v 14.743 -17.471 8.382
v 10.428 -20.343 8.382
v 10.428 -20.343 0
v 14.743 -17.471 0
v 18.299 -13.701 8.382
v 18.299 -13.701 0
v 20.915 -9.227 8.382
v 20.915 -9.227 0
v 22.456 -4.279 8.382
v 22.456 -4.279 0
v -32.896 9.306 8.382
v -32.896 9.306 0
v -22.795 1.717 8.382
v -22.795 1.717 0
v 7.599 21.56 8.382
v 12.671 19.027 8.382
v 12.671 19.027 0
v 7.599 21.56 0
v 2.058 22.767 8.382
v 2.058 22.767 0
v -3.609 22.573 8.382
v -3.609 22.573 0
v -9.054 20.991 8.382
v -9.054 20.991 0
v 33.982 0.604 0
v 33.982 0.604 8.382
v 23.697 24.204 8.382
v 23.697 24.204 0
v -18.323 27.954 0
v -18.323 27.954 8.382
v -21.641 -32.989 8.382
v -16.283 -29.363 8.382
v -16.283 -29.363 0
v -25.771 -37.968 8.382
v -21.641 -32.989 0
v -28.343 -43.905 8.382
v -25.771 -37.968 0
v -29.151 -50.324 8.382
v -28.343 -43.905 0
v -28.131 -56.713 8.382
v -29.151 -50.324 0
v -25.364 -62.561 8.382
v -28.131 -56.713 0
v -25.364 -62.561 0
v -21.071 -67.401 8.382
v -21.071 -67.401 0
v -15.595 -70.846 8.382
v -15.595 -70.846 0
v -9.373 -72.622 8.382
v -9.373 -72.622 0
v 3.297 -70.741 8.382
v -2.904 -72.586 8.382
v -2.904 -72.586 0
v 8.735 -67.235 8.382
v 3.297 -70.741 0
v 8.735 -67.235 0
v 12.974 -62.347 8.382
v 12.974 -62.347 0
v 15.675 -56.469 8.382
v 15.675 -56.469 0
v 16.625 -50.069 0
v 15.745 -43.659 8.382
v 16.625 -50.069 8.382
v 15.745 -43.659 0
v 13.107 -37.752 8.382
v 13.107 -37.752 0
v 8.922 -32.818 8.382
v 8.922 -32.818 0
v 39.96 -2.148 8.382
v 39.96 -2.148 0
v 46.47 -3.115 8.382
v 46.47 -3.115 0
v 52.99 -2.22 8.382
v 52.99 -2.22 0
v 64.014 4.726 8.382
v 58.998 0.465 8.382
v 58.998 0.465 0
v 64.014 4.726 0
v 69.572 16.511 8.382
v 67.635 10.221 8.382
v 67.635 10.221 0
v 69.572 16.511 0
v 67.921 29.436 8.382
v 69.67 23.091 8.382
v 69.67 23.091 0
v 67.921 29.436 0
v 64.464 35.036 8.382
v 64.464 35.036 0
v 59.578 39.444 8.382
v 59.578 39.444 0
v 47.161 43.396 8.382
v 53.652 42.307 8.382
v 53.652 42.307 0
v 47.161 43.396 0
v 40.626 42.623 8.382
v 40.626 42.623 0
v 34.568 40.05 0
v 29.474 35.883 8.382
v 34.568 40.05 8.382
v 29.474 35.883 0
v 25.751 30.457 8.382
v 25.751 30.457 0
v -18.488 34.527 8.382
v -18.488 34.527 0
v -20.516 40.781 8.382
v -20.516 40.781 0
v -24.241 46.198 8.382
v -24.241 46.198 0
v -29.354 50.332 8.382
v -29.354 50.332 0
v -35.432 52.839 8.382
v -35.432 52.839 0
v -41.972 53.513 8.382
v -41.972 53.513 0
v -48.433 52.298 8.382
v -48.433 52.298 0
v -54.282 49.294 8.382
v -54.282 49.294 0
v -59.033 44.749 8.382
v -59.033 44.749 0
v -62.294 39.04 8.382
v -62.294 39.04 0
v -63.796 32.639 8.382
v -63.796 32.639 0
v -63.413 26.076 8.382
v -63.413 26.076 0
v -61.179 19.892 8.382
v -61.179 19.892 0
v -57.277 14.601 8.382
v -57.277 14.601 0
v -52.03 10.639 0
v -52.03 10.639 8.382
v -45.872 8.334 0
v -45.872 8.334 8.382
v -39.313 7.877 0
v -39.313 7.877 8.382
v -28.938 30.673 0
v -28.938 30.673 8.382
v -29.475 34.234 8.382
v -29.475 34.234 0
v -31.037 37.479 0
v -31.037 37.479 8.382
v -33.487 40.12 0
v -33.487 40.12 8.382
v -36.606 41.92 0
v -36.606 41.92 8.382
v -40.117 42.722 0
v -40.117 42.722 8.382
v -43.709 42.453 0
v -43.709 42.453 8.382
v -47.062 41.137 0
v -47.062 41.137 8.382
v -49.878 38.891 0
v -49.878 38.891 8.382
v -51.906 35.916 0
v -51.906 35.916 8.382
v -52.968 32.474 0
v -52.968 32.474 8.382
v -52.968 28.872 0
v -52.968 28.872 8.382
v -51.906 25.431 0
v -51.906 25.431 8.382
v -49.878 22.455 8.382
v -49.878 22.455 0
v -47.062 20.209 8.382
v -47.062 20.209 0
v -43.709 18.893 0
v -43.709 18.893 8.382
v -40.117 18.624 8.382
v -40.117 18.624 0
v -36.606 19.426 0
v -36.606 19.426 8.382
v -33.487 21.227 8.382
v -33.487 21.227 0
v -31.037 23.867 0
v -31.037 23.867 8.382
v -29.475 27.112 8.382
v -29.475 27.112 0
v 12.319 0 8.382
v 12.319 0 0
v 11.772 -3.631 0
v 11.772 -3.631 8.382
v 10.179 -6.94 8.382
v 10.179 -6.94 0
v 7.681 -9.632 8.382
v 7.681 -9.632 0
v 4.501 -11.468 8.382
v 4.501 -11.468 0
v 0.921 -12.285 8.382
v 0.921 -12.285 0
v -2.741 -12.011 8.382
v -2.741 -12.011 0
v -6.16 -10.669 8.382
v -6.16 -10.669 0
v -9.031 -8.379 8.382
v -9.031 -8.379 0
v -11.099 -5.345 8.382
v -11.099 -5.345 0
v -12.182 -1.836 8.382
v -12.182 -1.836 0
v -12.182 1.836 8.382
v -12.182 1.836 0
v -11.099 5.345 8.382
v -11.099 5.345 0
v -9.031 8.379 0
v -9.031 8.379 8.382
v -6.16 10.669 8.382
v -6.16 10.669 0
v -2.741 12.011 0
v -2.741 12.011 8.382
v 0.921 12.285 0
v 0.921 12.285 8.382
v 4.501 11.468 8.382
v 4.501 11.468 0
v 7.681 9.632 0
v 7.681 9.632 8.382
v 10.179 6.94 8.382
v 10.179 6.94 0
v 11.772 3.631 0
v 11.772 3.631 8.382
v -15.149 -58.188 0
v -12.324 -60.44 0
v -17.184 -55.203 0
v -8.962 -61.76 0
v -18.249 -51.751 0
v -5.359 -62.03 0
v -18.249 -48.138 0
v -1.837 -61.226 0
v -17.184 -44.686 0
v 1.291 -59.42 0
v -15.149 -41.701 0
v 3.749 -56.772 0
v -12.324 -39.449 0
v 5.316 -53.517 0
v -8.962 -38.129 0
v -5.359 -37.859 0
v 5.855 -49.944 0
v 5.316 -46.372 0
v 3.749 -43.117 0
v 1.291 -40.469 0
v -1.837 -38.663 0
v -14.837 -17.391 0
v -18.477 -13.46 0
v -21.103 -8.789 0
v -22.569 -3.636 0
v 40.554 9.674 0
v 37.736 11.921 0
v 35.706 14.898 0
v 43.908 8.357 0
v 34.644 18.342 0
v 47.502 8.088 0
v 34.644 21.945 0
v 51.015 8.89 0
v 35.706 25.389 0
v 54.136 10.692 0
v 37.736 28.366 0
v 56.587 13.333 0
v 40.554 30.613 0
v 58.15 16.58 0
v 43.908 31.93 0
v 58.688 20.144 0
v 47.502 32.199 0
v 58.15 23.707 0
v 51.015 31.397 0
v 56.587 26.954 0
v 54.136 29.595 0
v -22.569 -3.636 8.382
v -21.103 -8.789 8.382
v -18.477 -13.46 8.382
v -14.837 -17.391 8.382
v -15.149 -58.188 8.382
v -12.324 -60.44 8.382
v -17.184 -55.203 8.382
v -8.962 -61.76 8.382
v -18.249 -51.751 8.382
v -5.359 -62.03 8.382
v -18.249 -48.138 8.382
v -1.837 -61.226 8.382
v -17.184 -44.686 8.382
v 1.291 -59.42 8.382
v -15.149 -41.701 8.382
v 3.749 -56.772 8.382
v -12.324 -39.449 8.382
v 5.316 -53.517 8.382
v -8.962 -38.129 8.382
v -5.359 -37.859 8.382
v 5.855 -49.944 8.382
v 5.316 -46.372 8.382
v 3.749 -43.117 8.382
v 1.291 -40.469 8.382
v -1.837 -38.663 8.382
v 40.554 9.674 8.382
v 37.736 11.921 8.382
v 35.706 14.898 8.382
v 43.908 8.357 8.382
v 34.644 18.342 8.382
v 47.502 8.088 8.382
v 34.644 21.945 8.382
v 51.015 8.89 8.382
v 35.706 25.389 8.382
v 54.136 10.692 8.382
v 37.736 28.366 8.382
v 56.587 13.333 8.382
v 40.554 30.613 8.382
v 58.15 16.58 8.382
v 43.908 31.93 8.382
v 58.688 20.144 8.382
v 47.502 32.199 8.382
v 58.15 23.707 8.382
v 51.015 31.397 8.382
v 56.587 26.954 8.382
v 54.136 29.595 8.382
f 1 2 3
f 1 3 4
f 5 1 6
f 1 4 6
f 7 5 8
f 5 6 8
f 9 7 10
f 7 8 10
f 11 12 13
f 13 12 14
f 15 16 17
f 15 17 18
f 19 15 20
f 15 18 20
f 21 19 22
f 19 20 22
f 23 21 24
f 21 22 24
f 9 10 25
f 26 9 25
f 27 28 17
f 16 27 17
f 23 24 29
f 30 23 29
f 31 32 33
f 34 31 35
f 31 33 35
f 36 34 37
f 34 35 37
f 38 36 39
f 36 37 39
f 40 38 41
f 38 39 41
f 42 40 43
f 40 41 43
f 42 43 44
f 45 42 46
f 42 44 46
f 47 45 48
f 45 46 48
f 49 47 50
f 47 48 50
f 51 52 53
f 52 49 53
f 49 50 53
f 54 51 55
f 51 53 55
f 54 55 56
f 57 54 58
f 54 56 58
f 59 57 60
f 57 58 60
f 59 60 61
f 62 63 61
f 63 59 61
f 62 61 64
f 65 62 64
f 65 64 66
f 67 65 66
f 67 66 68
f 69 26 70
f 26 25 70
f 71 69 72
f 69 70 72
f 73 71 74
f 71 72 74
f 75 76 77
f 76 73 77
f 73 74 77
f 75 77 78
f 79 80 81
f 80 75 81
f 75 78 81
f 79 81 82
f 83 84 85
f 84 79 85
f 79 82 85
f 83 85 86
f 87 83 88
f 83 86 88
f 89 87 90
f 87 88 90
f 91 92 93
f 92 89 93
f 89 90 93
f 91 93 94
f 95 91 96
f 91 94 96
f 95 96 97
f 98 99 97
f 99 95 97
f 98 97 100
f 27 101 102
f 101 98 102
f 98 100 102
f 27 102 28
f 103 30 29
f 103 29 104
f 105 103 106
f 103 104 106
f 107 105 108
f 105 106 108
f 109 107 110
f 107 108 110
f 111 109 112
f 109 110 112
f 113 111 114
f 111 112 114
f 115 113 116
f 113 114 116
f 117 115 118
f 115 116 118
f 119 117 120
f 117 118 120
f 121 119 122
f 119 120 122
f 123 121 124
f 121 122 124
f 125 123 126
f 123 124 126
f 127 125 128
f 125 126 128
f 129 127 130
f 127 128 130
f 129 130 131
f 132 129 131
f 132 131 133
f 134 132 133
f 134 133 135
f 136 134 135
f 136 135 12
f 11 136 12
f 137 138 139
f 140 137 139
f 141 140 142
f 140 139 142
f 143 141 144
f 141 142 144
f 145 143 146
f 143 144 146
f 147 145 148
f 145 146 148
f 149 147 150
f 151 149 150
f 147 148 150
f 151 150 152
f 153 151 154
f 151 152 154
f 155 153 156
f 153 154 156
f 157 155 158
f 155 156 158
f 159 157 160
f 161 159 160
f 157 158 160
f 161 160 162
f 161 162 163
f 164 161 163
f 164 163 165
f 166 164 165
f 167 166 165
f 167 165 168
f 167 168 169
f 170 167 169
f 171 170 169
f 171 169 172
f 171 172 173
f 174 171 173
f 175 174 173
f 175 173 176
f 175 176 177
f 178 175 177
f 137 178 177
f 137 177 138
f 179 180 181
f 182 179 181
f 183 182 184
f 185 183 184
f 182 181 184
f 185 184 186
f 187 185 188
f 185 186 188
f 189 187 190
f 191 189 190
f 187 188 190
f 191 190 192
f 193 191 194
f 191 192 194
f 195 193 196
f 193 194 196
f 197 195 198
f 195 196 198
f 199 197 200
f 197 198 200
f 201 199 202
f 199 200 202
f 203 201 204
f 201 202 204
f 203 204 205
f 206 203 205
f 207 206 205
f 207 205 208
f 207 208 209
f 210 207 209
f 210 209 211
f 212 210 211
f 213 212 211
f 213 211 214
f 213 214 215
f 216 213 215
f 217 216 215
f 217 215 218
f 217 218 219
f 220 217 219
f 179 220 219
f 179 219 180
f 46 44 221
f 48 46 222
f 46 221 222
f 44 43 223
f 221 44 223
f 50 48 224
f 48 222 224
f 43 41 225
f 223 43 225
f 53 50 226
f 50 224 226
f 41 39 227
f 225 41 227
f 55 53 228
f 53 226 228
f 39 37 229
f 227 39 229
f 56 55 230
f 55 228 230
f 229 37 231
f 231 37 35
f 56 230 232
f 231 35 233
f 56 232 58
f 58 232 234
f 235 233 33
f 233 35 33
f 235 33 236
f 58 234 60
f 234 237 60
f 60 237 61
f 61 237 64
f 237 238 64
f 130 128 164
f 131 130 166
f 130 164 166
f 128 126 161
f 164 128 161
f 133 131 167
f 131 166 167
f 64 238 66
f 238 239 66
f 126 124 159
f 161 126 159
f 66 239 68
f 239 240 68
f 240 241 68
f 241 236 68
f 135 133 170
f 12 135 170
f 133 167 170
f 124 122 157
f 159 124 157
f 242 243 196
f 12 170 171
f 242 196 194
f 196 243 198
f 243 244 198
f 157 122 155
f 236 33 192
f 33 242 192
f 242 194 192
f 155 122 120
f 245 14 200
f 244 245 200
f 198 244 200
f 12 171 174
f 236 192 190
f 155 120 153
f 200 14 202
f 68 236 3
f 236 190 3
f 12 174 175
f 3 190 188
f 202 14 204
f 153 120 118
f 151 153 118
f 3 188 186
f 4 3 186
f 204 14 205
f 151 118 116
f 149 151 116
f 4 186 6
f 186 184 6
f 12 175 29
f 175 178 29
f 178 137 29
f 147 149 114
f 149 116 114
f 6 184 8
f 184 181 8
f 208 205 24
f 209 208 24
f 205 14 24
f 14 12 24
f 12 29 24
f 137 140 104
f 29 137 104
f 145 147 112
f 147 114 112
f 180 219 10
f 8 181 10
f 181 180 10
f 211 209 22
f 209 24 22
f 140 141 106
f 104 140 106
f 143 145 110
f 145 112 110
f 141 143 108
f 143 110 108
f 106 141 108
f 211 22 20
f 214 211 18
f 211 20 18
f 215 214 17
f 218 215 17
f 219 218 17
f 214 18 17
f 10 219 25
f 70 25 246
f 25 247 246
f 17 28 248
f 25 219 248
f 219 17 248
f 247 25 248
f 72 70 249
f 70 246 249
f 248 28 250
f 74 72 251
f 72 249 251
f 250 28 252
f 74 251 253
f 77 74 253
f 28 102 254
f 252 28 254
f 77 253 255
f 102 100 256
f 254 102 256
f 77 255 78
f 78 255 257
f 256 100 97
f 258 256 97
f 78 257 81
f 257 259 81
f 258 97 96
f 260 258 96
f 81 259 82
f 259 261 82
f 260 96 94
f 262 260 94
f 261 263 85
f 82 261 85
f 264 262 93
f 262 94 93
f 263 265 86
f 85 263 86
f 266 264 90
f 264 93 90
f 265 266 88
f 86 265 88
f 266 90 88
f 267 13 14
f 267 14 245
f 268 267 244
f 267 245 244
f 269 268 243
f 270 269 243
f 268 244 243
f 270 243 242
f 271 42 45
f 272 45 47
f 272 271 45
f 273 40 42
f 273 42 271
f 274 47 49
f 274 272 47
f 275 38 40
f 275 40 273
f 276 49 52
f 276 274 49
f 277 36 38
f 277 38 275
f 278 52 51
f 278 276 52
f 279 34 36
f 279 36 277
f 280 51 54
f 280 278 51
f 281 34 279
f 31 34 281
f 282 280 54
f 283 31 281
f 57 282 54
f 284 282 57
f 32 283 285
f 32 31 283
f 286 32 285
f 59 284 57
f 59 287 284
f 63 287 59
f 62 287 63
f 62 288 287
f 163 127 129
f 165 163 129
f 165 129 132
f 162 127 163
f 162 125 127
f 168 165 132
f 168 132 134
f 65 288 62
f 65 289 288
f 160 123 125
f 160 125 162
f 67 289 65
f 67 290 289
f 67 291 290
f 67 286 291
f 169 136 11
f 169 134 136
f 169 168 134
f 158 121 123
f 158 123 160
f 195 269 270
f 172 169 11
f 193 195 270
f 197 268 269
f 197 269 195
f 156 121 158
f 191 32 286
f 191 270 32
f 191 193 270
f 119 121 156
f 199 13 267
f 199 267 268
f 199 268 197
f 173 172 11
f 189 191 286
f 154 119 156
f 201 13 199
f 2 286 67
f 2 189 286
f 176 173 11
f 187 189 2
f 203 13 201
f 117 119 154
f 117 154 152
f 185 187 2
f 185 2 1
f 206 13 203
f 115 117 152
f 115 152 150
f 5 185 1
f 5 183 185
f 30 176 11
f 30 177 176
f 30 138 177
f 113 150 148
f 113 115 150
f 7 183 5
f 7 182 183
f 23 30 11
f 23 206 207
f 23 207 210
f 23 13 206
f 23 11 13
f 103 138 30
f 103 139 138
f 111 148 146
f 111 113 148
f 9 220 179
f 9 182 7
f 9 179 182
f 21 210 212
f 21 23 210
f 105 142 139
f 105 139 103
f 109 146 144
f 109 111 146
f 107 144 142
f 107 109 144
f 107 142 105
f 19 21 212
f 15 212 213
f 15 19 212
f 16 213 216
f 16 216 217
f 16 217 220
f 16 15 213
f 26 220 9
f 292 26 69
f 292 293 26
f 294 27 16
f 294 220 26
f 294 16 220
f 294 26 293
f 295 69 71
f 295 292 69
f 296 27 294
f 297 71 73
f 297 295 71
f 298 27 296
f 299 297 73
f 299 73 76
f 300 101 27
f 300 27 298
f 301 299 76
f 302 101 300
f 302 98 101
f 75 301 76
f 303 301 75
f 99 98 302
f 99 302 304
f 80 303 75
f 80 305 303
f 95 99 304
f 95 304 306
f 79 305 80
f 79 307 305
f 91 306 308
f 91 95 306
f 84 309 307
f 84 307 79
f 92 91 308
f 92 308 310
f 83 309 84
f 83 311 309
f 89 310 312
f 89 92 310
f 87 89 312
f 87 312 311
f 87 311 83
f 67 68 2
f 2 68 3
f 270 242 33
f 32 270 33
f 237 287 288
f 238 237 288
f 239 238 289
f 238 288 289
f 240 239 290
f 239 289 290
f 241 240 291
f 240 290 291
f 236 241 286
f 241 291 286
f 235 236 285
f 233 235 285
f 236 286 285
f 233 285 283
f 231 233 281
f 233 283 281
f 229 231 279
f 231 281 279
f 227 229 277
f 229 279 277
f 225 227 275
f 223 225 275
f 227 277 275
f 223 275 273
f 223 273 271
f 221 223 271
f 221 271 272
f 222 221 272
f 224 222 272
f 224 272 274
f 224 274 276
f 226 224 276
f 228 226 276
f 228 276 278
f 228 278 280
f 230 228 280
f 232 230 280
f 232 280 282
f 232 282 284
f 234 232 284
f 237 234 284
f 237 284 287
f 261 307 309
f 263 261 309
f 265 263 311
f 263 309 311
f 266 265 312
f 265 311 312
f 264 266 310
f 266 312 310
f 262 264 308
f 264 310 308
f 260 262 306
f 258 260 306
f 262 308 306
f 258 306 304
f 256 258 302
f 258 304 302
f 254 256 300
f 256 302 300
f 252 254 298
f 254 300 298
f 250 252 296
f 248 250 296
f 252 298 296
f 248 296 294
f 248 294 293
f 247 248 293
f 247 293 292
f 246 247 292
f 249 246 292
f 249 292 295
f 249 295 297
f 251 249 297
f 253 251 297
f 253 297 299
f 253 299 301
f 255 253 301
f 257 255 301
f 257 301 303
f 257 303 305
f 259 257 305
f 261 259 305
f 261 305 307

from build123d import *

# Parameters (mm, degrees)
F1_R      = 22.86
F8_DEPTH  = 8.382
F5_R      = 22.86
F5_R_2    = 23.2590602535
F5_R_3    = 22.8896939672
F3_R      = 12.065
F9_DEPTH  = 25.908
F0_R      = 12.065
F10_DEPTH = 39.878
F12_R     = 12.0825397837
F12_R_2   = 12.1193647321
F12_R_3   = 12.0891778509
F13_DEPTH = 25.4
F14_R     = 12.3194510373
F15_DEPTH = 25.4


with BuildPart() as f8:
    # F1 (on Top) → F8 (new body)
    with BuildSketch(Plane.XY):
        Circle(F1_R)
    extrude(amount=F8_DEPTH)

    # F3 (on Top) → F9 (cut)
    with BuildSketch(Plane.XY):
        with Locations((-41.2355296061, 30.9968510523)):
            Circle(F3_R)
        with Locations((47.3912737196, 20.2672132623)):
            Circle(F3_R)
        with Locations((-6.2569124064, -50.5483931394)):
            Circle(F3_R)
    extrude(amount=-F9_DEPTH, mode=Mode.SUBTRACT)


with BuildPart() as f8b:
    # F4 (on Top) → F8, piece 2 (new body)
    with BuildSketch(Plane.XY):
        Polygon((-7.2568234486, -9.9568761684), (0, 0), (-40.8516675234, 30.6916665286), (-48.2515008219, 20.8422329908), align=None)
        Polygon((-40.8516675234, 30.6916665286), (0, 0), (6.6820263642, 9.1682138243), (-33.8416725592, 39.6134790794), align=None)
    extrude(amount=F8_DEPTH)


with BuildPart() as f8c:
    # F5 (on Top) → F8, piece 3 (new body)
    with BuildSketch(Plane.XY):
        with Locations((-41.0204199318, 30.6730984167)):
            Circle(F5_R)
    extrude(amount=F8_DEPTH)


with BuildPart() as f8d:
    # F5 (on Top) → F8, piece 4 (new body)
    with BuildSketch(Plane.XY):
        with Locations((46.5983533047, 20.1435375921)):
            Circle(F5_R_2)
    extrude(amount=F8_DEPTH)


with BuildPart() as f8e:
    # F5 (on Top) → F8, piece 5 (new body)
    with BuildSketch(Plane.XY):
        with Locations((-6.2648058406, -49.9444669655)):
            Circle(F5_R_3)
    extrude(amount=F8_DEPTH)


with BuildPart() as f8f:
    # F6 (on Top) → F8, piece 6 (new body)
    with BuildSketch(Plane.XY):
        Polygon((-6.1354051676, -50.8), (0, 0), (-12.4105271356, 2.6960742232), (-18.6884442668, -49.2838980126), align=None)
        Polygon((12.7, -1.5338512919), (0, 0), (-6.1354051676, -50.8), (6.5645948324, -52.3338512919), align=None)
    extrude(amount=F8_DEPTH)


with BuildPart() as f8g:
    # F7 (on Top) → F8, piece 7 (new body)
    with BuildSketch(Plane.XY):
        Polygon((-4.6202341585, 10.9058370142), (0, 0), (46.7755481242, 19.8163593447), (41.3952207145, 32.5163593447), align=None)
        Polygon((46.7755481242, 19.8163593447), (0, 0), (5.4993537205, -11.462887171), (51.7296379604, 8.1224723137), align=None)
    extrude(amount=F8_DEPTH)


with BuildPart() as f10_tool:
    # F0 (on Top) → F10 (new body)
    with BuildSketch(Plane.XY):
        Circle(F0_R)
    extrude(amount=F10_DEPTH)


with BuildPart() as f8_1:
    add(f8.part)

    # F10: cut by f10_tool
    add(f10_tool.part, mode=Mode.SUBTRACT)


with BuildPart() as f8b_1:
    add(f8b.part)

    # F10: cut by f10_tool
    add(f10_tool.part, mode=Mode.SUBTRACT)


with BuildPart() as f8f_1:
    add(f8f.part)

    # F10: cut by f10_tool
    add(f10_tool.part, mode=Mode.SUBTRACT)


with BuildPart() as f8g_1:
    add(f8g.part)

    # F10: cut by f10_tool
    add(f10_tool.part, mode=Mode.SUBTRACT)


with BuildPart() as f8f_2:
    add(f8f_1.part)

    # F11: union F8b, F8c, F8, F8d, F8e, F8g
    add(f8b_1.part)
    add(f8c.part)
    add(f8_1.part)
    add(f8d.part)
    add(f8e.part)
    add(f8g_1.part)

    # F12 (on face) → F13 (cut)
    with BuildSketch(Plane.XY.offset(8.382)):
        with Locations((-41.0204199318, 30.6730984167)):
            Circle(F12_R)
        with Locations((-6.2648058406, -49.9444669655)):
            Circle(F12_R_2)
        with Locations((46.5983533047, 20.1435375921)):
            Circle(F12_R_3)
    extrude(amount=-F13_DEPTH, mode=Mode.SUBTRACT)

    # F14 (on face) → F15 (cut)
    with BuildSketch(Plane(origin=(0, 0, 0), x_dir=(1, 0, 0), z_dir=(0, 0, -1))):
        Circle(F14_R)
    extrude(amount=-F15_DEPTH, mode=Mode.SUBTRACT)


solid = f8f_2.part
